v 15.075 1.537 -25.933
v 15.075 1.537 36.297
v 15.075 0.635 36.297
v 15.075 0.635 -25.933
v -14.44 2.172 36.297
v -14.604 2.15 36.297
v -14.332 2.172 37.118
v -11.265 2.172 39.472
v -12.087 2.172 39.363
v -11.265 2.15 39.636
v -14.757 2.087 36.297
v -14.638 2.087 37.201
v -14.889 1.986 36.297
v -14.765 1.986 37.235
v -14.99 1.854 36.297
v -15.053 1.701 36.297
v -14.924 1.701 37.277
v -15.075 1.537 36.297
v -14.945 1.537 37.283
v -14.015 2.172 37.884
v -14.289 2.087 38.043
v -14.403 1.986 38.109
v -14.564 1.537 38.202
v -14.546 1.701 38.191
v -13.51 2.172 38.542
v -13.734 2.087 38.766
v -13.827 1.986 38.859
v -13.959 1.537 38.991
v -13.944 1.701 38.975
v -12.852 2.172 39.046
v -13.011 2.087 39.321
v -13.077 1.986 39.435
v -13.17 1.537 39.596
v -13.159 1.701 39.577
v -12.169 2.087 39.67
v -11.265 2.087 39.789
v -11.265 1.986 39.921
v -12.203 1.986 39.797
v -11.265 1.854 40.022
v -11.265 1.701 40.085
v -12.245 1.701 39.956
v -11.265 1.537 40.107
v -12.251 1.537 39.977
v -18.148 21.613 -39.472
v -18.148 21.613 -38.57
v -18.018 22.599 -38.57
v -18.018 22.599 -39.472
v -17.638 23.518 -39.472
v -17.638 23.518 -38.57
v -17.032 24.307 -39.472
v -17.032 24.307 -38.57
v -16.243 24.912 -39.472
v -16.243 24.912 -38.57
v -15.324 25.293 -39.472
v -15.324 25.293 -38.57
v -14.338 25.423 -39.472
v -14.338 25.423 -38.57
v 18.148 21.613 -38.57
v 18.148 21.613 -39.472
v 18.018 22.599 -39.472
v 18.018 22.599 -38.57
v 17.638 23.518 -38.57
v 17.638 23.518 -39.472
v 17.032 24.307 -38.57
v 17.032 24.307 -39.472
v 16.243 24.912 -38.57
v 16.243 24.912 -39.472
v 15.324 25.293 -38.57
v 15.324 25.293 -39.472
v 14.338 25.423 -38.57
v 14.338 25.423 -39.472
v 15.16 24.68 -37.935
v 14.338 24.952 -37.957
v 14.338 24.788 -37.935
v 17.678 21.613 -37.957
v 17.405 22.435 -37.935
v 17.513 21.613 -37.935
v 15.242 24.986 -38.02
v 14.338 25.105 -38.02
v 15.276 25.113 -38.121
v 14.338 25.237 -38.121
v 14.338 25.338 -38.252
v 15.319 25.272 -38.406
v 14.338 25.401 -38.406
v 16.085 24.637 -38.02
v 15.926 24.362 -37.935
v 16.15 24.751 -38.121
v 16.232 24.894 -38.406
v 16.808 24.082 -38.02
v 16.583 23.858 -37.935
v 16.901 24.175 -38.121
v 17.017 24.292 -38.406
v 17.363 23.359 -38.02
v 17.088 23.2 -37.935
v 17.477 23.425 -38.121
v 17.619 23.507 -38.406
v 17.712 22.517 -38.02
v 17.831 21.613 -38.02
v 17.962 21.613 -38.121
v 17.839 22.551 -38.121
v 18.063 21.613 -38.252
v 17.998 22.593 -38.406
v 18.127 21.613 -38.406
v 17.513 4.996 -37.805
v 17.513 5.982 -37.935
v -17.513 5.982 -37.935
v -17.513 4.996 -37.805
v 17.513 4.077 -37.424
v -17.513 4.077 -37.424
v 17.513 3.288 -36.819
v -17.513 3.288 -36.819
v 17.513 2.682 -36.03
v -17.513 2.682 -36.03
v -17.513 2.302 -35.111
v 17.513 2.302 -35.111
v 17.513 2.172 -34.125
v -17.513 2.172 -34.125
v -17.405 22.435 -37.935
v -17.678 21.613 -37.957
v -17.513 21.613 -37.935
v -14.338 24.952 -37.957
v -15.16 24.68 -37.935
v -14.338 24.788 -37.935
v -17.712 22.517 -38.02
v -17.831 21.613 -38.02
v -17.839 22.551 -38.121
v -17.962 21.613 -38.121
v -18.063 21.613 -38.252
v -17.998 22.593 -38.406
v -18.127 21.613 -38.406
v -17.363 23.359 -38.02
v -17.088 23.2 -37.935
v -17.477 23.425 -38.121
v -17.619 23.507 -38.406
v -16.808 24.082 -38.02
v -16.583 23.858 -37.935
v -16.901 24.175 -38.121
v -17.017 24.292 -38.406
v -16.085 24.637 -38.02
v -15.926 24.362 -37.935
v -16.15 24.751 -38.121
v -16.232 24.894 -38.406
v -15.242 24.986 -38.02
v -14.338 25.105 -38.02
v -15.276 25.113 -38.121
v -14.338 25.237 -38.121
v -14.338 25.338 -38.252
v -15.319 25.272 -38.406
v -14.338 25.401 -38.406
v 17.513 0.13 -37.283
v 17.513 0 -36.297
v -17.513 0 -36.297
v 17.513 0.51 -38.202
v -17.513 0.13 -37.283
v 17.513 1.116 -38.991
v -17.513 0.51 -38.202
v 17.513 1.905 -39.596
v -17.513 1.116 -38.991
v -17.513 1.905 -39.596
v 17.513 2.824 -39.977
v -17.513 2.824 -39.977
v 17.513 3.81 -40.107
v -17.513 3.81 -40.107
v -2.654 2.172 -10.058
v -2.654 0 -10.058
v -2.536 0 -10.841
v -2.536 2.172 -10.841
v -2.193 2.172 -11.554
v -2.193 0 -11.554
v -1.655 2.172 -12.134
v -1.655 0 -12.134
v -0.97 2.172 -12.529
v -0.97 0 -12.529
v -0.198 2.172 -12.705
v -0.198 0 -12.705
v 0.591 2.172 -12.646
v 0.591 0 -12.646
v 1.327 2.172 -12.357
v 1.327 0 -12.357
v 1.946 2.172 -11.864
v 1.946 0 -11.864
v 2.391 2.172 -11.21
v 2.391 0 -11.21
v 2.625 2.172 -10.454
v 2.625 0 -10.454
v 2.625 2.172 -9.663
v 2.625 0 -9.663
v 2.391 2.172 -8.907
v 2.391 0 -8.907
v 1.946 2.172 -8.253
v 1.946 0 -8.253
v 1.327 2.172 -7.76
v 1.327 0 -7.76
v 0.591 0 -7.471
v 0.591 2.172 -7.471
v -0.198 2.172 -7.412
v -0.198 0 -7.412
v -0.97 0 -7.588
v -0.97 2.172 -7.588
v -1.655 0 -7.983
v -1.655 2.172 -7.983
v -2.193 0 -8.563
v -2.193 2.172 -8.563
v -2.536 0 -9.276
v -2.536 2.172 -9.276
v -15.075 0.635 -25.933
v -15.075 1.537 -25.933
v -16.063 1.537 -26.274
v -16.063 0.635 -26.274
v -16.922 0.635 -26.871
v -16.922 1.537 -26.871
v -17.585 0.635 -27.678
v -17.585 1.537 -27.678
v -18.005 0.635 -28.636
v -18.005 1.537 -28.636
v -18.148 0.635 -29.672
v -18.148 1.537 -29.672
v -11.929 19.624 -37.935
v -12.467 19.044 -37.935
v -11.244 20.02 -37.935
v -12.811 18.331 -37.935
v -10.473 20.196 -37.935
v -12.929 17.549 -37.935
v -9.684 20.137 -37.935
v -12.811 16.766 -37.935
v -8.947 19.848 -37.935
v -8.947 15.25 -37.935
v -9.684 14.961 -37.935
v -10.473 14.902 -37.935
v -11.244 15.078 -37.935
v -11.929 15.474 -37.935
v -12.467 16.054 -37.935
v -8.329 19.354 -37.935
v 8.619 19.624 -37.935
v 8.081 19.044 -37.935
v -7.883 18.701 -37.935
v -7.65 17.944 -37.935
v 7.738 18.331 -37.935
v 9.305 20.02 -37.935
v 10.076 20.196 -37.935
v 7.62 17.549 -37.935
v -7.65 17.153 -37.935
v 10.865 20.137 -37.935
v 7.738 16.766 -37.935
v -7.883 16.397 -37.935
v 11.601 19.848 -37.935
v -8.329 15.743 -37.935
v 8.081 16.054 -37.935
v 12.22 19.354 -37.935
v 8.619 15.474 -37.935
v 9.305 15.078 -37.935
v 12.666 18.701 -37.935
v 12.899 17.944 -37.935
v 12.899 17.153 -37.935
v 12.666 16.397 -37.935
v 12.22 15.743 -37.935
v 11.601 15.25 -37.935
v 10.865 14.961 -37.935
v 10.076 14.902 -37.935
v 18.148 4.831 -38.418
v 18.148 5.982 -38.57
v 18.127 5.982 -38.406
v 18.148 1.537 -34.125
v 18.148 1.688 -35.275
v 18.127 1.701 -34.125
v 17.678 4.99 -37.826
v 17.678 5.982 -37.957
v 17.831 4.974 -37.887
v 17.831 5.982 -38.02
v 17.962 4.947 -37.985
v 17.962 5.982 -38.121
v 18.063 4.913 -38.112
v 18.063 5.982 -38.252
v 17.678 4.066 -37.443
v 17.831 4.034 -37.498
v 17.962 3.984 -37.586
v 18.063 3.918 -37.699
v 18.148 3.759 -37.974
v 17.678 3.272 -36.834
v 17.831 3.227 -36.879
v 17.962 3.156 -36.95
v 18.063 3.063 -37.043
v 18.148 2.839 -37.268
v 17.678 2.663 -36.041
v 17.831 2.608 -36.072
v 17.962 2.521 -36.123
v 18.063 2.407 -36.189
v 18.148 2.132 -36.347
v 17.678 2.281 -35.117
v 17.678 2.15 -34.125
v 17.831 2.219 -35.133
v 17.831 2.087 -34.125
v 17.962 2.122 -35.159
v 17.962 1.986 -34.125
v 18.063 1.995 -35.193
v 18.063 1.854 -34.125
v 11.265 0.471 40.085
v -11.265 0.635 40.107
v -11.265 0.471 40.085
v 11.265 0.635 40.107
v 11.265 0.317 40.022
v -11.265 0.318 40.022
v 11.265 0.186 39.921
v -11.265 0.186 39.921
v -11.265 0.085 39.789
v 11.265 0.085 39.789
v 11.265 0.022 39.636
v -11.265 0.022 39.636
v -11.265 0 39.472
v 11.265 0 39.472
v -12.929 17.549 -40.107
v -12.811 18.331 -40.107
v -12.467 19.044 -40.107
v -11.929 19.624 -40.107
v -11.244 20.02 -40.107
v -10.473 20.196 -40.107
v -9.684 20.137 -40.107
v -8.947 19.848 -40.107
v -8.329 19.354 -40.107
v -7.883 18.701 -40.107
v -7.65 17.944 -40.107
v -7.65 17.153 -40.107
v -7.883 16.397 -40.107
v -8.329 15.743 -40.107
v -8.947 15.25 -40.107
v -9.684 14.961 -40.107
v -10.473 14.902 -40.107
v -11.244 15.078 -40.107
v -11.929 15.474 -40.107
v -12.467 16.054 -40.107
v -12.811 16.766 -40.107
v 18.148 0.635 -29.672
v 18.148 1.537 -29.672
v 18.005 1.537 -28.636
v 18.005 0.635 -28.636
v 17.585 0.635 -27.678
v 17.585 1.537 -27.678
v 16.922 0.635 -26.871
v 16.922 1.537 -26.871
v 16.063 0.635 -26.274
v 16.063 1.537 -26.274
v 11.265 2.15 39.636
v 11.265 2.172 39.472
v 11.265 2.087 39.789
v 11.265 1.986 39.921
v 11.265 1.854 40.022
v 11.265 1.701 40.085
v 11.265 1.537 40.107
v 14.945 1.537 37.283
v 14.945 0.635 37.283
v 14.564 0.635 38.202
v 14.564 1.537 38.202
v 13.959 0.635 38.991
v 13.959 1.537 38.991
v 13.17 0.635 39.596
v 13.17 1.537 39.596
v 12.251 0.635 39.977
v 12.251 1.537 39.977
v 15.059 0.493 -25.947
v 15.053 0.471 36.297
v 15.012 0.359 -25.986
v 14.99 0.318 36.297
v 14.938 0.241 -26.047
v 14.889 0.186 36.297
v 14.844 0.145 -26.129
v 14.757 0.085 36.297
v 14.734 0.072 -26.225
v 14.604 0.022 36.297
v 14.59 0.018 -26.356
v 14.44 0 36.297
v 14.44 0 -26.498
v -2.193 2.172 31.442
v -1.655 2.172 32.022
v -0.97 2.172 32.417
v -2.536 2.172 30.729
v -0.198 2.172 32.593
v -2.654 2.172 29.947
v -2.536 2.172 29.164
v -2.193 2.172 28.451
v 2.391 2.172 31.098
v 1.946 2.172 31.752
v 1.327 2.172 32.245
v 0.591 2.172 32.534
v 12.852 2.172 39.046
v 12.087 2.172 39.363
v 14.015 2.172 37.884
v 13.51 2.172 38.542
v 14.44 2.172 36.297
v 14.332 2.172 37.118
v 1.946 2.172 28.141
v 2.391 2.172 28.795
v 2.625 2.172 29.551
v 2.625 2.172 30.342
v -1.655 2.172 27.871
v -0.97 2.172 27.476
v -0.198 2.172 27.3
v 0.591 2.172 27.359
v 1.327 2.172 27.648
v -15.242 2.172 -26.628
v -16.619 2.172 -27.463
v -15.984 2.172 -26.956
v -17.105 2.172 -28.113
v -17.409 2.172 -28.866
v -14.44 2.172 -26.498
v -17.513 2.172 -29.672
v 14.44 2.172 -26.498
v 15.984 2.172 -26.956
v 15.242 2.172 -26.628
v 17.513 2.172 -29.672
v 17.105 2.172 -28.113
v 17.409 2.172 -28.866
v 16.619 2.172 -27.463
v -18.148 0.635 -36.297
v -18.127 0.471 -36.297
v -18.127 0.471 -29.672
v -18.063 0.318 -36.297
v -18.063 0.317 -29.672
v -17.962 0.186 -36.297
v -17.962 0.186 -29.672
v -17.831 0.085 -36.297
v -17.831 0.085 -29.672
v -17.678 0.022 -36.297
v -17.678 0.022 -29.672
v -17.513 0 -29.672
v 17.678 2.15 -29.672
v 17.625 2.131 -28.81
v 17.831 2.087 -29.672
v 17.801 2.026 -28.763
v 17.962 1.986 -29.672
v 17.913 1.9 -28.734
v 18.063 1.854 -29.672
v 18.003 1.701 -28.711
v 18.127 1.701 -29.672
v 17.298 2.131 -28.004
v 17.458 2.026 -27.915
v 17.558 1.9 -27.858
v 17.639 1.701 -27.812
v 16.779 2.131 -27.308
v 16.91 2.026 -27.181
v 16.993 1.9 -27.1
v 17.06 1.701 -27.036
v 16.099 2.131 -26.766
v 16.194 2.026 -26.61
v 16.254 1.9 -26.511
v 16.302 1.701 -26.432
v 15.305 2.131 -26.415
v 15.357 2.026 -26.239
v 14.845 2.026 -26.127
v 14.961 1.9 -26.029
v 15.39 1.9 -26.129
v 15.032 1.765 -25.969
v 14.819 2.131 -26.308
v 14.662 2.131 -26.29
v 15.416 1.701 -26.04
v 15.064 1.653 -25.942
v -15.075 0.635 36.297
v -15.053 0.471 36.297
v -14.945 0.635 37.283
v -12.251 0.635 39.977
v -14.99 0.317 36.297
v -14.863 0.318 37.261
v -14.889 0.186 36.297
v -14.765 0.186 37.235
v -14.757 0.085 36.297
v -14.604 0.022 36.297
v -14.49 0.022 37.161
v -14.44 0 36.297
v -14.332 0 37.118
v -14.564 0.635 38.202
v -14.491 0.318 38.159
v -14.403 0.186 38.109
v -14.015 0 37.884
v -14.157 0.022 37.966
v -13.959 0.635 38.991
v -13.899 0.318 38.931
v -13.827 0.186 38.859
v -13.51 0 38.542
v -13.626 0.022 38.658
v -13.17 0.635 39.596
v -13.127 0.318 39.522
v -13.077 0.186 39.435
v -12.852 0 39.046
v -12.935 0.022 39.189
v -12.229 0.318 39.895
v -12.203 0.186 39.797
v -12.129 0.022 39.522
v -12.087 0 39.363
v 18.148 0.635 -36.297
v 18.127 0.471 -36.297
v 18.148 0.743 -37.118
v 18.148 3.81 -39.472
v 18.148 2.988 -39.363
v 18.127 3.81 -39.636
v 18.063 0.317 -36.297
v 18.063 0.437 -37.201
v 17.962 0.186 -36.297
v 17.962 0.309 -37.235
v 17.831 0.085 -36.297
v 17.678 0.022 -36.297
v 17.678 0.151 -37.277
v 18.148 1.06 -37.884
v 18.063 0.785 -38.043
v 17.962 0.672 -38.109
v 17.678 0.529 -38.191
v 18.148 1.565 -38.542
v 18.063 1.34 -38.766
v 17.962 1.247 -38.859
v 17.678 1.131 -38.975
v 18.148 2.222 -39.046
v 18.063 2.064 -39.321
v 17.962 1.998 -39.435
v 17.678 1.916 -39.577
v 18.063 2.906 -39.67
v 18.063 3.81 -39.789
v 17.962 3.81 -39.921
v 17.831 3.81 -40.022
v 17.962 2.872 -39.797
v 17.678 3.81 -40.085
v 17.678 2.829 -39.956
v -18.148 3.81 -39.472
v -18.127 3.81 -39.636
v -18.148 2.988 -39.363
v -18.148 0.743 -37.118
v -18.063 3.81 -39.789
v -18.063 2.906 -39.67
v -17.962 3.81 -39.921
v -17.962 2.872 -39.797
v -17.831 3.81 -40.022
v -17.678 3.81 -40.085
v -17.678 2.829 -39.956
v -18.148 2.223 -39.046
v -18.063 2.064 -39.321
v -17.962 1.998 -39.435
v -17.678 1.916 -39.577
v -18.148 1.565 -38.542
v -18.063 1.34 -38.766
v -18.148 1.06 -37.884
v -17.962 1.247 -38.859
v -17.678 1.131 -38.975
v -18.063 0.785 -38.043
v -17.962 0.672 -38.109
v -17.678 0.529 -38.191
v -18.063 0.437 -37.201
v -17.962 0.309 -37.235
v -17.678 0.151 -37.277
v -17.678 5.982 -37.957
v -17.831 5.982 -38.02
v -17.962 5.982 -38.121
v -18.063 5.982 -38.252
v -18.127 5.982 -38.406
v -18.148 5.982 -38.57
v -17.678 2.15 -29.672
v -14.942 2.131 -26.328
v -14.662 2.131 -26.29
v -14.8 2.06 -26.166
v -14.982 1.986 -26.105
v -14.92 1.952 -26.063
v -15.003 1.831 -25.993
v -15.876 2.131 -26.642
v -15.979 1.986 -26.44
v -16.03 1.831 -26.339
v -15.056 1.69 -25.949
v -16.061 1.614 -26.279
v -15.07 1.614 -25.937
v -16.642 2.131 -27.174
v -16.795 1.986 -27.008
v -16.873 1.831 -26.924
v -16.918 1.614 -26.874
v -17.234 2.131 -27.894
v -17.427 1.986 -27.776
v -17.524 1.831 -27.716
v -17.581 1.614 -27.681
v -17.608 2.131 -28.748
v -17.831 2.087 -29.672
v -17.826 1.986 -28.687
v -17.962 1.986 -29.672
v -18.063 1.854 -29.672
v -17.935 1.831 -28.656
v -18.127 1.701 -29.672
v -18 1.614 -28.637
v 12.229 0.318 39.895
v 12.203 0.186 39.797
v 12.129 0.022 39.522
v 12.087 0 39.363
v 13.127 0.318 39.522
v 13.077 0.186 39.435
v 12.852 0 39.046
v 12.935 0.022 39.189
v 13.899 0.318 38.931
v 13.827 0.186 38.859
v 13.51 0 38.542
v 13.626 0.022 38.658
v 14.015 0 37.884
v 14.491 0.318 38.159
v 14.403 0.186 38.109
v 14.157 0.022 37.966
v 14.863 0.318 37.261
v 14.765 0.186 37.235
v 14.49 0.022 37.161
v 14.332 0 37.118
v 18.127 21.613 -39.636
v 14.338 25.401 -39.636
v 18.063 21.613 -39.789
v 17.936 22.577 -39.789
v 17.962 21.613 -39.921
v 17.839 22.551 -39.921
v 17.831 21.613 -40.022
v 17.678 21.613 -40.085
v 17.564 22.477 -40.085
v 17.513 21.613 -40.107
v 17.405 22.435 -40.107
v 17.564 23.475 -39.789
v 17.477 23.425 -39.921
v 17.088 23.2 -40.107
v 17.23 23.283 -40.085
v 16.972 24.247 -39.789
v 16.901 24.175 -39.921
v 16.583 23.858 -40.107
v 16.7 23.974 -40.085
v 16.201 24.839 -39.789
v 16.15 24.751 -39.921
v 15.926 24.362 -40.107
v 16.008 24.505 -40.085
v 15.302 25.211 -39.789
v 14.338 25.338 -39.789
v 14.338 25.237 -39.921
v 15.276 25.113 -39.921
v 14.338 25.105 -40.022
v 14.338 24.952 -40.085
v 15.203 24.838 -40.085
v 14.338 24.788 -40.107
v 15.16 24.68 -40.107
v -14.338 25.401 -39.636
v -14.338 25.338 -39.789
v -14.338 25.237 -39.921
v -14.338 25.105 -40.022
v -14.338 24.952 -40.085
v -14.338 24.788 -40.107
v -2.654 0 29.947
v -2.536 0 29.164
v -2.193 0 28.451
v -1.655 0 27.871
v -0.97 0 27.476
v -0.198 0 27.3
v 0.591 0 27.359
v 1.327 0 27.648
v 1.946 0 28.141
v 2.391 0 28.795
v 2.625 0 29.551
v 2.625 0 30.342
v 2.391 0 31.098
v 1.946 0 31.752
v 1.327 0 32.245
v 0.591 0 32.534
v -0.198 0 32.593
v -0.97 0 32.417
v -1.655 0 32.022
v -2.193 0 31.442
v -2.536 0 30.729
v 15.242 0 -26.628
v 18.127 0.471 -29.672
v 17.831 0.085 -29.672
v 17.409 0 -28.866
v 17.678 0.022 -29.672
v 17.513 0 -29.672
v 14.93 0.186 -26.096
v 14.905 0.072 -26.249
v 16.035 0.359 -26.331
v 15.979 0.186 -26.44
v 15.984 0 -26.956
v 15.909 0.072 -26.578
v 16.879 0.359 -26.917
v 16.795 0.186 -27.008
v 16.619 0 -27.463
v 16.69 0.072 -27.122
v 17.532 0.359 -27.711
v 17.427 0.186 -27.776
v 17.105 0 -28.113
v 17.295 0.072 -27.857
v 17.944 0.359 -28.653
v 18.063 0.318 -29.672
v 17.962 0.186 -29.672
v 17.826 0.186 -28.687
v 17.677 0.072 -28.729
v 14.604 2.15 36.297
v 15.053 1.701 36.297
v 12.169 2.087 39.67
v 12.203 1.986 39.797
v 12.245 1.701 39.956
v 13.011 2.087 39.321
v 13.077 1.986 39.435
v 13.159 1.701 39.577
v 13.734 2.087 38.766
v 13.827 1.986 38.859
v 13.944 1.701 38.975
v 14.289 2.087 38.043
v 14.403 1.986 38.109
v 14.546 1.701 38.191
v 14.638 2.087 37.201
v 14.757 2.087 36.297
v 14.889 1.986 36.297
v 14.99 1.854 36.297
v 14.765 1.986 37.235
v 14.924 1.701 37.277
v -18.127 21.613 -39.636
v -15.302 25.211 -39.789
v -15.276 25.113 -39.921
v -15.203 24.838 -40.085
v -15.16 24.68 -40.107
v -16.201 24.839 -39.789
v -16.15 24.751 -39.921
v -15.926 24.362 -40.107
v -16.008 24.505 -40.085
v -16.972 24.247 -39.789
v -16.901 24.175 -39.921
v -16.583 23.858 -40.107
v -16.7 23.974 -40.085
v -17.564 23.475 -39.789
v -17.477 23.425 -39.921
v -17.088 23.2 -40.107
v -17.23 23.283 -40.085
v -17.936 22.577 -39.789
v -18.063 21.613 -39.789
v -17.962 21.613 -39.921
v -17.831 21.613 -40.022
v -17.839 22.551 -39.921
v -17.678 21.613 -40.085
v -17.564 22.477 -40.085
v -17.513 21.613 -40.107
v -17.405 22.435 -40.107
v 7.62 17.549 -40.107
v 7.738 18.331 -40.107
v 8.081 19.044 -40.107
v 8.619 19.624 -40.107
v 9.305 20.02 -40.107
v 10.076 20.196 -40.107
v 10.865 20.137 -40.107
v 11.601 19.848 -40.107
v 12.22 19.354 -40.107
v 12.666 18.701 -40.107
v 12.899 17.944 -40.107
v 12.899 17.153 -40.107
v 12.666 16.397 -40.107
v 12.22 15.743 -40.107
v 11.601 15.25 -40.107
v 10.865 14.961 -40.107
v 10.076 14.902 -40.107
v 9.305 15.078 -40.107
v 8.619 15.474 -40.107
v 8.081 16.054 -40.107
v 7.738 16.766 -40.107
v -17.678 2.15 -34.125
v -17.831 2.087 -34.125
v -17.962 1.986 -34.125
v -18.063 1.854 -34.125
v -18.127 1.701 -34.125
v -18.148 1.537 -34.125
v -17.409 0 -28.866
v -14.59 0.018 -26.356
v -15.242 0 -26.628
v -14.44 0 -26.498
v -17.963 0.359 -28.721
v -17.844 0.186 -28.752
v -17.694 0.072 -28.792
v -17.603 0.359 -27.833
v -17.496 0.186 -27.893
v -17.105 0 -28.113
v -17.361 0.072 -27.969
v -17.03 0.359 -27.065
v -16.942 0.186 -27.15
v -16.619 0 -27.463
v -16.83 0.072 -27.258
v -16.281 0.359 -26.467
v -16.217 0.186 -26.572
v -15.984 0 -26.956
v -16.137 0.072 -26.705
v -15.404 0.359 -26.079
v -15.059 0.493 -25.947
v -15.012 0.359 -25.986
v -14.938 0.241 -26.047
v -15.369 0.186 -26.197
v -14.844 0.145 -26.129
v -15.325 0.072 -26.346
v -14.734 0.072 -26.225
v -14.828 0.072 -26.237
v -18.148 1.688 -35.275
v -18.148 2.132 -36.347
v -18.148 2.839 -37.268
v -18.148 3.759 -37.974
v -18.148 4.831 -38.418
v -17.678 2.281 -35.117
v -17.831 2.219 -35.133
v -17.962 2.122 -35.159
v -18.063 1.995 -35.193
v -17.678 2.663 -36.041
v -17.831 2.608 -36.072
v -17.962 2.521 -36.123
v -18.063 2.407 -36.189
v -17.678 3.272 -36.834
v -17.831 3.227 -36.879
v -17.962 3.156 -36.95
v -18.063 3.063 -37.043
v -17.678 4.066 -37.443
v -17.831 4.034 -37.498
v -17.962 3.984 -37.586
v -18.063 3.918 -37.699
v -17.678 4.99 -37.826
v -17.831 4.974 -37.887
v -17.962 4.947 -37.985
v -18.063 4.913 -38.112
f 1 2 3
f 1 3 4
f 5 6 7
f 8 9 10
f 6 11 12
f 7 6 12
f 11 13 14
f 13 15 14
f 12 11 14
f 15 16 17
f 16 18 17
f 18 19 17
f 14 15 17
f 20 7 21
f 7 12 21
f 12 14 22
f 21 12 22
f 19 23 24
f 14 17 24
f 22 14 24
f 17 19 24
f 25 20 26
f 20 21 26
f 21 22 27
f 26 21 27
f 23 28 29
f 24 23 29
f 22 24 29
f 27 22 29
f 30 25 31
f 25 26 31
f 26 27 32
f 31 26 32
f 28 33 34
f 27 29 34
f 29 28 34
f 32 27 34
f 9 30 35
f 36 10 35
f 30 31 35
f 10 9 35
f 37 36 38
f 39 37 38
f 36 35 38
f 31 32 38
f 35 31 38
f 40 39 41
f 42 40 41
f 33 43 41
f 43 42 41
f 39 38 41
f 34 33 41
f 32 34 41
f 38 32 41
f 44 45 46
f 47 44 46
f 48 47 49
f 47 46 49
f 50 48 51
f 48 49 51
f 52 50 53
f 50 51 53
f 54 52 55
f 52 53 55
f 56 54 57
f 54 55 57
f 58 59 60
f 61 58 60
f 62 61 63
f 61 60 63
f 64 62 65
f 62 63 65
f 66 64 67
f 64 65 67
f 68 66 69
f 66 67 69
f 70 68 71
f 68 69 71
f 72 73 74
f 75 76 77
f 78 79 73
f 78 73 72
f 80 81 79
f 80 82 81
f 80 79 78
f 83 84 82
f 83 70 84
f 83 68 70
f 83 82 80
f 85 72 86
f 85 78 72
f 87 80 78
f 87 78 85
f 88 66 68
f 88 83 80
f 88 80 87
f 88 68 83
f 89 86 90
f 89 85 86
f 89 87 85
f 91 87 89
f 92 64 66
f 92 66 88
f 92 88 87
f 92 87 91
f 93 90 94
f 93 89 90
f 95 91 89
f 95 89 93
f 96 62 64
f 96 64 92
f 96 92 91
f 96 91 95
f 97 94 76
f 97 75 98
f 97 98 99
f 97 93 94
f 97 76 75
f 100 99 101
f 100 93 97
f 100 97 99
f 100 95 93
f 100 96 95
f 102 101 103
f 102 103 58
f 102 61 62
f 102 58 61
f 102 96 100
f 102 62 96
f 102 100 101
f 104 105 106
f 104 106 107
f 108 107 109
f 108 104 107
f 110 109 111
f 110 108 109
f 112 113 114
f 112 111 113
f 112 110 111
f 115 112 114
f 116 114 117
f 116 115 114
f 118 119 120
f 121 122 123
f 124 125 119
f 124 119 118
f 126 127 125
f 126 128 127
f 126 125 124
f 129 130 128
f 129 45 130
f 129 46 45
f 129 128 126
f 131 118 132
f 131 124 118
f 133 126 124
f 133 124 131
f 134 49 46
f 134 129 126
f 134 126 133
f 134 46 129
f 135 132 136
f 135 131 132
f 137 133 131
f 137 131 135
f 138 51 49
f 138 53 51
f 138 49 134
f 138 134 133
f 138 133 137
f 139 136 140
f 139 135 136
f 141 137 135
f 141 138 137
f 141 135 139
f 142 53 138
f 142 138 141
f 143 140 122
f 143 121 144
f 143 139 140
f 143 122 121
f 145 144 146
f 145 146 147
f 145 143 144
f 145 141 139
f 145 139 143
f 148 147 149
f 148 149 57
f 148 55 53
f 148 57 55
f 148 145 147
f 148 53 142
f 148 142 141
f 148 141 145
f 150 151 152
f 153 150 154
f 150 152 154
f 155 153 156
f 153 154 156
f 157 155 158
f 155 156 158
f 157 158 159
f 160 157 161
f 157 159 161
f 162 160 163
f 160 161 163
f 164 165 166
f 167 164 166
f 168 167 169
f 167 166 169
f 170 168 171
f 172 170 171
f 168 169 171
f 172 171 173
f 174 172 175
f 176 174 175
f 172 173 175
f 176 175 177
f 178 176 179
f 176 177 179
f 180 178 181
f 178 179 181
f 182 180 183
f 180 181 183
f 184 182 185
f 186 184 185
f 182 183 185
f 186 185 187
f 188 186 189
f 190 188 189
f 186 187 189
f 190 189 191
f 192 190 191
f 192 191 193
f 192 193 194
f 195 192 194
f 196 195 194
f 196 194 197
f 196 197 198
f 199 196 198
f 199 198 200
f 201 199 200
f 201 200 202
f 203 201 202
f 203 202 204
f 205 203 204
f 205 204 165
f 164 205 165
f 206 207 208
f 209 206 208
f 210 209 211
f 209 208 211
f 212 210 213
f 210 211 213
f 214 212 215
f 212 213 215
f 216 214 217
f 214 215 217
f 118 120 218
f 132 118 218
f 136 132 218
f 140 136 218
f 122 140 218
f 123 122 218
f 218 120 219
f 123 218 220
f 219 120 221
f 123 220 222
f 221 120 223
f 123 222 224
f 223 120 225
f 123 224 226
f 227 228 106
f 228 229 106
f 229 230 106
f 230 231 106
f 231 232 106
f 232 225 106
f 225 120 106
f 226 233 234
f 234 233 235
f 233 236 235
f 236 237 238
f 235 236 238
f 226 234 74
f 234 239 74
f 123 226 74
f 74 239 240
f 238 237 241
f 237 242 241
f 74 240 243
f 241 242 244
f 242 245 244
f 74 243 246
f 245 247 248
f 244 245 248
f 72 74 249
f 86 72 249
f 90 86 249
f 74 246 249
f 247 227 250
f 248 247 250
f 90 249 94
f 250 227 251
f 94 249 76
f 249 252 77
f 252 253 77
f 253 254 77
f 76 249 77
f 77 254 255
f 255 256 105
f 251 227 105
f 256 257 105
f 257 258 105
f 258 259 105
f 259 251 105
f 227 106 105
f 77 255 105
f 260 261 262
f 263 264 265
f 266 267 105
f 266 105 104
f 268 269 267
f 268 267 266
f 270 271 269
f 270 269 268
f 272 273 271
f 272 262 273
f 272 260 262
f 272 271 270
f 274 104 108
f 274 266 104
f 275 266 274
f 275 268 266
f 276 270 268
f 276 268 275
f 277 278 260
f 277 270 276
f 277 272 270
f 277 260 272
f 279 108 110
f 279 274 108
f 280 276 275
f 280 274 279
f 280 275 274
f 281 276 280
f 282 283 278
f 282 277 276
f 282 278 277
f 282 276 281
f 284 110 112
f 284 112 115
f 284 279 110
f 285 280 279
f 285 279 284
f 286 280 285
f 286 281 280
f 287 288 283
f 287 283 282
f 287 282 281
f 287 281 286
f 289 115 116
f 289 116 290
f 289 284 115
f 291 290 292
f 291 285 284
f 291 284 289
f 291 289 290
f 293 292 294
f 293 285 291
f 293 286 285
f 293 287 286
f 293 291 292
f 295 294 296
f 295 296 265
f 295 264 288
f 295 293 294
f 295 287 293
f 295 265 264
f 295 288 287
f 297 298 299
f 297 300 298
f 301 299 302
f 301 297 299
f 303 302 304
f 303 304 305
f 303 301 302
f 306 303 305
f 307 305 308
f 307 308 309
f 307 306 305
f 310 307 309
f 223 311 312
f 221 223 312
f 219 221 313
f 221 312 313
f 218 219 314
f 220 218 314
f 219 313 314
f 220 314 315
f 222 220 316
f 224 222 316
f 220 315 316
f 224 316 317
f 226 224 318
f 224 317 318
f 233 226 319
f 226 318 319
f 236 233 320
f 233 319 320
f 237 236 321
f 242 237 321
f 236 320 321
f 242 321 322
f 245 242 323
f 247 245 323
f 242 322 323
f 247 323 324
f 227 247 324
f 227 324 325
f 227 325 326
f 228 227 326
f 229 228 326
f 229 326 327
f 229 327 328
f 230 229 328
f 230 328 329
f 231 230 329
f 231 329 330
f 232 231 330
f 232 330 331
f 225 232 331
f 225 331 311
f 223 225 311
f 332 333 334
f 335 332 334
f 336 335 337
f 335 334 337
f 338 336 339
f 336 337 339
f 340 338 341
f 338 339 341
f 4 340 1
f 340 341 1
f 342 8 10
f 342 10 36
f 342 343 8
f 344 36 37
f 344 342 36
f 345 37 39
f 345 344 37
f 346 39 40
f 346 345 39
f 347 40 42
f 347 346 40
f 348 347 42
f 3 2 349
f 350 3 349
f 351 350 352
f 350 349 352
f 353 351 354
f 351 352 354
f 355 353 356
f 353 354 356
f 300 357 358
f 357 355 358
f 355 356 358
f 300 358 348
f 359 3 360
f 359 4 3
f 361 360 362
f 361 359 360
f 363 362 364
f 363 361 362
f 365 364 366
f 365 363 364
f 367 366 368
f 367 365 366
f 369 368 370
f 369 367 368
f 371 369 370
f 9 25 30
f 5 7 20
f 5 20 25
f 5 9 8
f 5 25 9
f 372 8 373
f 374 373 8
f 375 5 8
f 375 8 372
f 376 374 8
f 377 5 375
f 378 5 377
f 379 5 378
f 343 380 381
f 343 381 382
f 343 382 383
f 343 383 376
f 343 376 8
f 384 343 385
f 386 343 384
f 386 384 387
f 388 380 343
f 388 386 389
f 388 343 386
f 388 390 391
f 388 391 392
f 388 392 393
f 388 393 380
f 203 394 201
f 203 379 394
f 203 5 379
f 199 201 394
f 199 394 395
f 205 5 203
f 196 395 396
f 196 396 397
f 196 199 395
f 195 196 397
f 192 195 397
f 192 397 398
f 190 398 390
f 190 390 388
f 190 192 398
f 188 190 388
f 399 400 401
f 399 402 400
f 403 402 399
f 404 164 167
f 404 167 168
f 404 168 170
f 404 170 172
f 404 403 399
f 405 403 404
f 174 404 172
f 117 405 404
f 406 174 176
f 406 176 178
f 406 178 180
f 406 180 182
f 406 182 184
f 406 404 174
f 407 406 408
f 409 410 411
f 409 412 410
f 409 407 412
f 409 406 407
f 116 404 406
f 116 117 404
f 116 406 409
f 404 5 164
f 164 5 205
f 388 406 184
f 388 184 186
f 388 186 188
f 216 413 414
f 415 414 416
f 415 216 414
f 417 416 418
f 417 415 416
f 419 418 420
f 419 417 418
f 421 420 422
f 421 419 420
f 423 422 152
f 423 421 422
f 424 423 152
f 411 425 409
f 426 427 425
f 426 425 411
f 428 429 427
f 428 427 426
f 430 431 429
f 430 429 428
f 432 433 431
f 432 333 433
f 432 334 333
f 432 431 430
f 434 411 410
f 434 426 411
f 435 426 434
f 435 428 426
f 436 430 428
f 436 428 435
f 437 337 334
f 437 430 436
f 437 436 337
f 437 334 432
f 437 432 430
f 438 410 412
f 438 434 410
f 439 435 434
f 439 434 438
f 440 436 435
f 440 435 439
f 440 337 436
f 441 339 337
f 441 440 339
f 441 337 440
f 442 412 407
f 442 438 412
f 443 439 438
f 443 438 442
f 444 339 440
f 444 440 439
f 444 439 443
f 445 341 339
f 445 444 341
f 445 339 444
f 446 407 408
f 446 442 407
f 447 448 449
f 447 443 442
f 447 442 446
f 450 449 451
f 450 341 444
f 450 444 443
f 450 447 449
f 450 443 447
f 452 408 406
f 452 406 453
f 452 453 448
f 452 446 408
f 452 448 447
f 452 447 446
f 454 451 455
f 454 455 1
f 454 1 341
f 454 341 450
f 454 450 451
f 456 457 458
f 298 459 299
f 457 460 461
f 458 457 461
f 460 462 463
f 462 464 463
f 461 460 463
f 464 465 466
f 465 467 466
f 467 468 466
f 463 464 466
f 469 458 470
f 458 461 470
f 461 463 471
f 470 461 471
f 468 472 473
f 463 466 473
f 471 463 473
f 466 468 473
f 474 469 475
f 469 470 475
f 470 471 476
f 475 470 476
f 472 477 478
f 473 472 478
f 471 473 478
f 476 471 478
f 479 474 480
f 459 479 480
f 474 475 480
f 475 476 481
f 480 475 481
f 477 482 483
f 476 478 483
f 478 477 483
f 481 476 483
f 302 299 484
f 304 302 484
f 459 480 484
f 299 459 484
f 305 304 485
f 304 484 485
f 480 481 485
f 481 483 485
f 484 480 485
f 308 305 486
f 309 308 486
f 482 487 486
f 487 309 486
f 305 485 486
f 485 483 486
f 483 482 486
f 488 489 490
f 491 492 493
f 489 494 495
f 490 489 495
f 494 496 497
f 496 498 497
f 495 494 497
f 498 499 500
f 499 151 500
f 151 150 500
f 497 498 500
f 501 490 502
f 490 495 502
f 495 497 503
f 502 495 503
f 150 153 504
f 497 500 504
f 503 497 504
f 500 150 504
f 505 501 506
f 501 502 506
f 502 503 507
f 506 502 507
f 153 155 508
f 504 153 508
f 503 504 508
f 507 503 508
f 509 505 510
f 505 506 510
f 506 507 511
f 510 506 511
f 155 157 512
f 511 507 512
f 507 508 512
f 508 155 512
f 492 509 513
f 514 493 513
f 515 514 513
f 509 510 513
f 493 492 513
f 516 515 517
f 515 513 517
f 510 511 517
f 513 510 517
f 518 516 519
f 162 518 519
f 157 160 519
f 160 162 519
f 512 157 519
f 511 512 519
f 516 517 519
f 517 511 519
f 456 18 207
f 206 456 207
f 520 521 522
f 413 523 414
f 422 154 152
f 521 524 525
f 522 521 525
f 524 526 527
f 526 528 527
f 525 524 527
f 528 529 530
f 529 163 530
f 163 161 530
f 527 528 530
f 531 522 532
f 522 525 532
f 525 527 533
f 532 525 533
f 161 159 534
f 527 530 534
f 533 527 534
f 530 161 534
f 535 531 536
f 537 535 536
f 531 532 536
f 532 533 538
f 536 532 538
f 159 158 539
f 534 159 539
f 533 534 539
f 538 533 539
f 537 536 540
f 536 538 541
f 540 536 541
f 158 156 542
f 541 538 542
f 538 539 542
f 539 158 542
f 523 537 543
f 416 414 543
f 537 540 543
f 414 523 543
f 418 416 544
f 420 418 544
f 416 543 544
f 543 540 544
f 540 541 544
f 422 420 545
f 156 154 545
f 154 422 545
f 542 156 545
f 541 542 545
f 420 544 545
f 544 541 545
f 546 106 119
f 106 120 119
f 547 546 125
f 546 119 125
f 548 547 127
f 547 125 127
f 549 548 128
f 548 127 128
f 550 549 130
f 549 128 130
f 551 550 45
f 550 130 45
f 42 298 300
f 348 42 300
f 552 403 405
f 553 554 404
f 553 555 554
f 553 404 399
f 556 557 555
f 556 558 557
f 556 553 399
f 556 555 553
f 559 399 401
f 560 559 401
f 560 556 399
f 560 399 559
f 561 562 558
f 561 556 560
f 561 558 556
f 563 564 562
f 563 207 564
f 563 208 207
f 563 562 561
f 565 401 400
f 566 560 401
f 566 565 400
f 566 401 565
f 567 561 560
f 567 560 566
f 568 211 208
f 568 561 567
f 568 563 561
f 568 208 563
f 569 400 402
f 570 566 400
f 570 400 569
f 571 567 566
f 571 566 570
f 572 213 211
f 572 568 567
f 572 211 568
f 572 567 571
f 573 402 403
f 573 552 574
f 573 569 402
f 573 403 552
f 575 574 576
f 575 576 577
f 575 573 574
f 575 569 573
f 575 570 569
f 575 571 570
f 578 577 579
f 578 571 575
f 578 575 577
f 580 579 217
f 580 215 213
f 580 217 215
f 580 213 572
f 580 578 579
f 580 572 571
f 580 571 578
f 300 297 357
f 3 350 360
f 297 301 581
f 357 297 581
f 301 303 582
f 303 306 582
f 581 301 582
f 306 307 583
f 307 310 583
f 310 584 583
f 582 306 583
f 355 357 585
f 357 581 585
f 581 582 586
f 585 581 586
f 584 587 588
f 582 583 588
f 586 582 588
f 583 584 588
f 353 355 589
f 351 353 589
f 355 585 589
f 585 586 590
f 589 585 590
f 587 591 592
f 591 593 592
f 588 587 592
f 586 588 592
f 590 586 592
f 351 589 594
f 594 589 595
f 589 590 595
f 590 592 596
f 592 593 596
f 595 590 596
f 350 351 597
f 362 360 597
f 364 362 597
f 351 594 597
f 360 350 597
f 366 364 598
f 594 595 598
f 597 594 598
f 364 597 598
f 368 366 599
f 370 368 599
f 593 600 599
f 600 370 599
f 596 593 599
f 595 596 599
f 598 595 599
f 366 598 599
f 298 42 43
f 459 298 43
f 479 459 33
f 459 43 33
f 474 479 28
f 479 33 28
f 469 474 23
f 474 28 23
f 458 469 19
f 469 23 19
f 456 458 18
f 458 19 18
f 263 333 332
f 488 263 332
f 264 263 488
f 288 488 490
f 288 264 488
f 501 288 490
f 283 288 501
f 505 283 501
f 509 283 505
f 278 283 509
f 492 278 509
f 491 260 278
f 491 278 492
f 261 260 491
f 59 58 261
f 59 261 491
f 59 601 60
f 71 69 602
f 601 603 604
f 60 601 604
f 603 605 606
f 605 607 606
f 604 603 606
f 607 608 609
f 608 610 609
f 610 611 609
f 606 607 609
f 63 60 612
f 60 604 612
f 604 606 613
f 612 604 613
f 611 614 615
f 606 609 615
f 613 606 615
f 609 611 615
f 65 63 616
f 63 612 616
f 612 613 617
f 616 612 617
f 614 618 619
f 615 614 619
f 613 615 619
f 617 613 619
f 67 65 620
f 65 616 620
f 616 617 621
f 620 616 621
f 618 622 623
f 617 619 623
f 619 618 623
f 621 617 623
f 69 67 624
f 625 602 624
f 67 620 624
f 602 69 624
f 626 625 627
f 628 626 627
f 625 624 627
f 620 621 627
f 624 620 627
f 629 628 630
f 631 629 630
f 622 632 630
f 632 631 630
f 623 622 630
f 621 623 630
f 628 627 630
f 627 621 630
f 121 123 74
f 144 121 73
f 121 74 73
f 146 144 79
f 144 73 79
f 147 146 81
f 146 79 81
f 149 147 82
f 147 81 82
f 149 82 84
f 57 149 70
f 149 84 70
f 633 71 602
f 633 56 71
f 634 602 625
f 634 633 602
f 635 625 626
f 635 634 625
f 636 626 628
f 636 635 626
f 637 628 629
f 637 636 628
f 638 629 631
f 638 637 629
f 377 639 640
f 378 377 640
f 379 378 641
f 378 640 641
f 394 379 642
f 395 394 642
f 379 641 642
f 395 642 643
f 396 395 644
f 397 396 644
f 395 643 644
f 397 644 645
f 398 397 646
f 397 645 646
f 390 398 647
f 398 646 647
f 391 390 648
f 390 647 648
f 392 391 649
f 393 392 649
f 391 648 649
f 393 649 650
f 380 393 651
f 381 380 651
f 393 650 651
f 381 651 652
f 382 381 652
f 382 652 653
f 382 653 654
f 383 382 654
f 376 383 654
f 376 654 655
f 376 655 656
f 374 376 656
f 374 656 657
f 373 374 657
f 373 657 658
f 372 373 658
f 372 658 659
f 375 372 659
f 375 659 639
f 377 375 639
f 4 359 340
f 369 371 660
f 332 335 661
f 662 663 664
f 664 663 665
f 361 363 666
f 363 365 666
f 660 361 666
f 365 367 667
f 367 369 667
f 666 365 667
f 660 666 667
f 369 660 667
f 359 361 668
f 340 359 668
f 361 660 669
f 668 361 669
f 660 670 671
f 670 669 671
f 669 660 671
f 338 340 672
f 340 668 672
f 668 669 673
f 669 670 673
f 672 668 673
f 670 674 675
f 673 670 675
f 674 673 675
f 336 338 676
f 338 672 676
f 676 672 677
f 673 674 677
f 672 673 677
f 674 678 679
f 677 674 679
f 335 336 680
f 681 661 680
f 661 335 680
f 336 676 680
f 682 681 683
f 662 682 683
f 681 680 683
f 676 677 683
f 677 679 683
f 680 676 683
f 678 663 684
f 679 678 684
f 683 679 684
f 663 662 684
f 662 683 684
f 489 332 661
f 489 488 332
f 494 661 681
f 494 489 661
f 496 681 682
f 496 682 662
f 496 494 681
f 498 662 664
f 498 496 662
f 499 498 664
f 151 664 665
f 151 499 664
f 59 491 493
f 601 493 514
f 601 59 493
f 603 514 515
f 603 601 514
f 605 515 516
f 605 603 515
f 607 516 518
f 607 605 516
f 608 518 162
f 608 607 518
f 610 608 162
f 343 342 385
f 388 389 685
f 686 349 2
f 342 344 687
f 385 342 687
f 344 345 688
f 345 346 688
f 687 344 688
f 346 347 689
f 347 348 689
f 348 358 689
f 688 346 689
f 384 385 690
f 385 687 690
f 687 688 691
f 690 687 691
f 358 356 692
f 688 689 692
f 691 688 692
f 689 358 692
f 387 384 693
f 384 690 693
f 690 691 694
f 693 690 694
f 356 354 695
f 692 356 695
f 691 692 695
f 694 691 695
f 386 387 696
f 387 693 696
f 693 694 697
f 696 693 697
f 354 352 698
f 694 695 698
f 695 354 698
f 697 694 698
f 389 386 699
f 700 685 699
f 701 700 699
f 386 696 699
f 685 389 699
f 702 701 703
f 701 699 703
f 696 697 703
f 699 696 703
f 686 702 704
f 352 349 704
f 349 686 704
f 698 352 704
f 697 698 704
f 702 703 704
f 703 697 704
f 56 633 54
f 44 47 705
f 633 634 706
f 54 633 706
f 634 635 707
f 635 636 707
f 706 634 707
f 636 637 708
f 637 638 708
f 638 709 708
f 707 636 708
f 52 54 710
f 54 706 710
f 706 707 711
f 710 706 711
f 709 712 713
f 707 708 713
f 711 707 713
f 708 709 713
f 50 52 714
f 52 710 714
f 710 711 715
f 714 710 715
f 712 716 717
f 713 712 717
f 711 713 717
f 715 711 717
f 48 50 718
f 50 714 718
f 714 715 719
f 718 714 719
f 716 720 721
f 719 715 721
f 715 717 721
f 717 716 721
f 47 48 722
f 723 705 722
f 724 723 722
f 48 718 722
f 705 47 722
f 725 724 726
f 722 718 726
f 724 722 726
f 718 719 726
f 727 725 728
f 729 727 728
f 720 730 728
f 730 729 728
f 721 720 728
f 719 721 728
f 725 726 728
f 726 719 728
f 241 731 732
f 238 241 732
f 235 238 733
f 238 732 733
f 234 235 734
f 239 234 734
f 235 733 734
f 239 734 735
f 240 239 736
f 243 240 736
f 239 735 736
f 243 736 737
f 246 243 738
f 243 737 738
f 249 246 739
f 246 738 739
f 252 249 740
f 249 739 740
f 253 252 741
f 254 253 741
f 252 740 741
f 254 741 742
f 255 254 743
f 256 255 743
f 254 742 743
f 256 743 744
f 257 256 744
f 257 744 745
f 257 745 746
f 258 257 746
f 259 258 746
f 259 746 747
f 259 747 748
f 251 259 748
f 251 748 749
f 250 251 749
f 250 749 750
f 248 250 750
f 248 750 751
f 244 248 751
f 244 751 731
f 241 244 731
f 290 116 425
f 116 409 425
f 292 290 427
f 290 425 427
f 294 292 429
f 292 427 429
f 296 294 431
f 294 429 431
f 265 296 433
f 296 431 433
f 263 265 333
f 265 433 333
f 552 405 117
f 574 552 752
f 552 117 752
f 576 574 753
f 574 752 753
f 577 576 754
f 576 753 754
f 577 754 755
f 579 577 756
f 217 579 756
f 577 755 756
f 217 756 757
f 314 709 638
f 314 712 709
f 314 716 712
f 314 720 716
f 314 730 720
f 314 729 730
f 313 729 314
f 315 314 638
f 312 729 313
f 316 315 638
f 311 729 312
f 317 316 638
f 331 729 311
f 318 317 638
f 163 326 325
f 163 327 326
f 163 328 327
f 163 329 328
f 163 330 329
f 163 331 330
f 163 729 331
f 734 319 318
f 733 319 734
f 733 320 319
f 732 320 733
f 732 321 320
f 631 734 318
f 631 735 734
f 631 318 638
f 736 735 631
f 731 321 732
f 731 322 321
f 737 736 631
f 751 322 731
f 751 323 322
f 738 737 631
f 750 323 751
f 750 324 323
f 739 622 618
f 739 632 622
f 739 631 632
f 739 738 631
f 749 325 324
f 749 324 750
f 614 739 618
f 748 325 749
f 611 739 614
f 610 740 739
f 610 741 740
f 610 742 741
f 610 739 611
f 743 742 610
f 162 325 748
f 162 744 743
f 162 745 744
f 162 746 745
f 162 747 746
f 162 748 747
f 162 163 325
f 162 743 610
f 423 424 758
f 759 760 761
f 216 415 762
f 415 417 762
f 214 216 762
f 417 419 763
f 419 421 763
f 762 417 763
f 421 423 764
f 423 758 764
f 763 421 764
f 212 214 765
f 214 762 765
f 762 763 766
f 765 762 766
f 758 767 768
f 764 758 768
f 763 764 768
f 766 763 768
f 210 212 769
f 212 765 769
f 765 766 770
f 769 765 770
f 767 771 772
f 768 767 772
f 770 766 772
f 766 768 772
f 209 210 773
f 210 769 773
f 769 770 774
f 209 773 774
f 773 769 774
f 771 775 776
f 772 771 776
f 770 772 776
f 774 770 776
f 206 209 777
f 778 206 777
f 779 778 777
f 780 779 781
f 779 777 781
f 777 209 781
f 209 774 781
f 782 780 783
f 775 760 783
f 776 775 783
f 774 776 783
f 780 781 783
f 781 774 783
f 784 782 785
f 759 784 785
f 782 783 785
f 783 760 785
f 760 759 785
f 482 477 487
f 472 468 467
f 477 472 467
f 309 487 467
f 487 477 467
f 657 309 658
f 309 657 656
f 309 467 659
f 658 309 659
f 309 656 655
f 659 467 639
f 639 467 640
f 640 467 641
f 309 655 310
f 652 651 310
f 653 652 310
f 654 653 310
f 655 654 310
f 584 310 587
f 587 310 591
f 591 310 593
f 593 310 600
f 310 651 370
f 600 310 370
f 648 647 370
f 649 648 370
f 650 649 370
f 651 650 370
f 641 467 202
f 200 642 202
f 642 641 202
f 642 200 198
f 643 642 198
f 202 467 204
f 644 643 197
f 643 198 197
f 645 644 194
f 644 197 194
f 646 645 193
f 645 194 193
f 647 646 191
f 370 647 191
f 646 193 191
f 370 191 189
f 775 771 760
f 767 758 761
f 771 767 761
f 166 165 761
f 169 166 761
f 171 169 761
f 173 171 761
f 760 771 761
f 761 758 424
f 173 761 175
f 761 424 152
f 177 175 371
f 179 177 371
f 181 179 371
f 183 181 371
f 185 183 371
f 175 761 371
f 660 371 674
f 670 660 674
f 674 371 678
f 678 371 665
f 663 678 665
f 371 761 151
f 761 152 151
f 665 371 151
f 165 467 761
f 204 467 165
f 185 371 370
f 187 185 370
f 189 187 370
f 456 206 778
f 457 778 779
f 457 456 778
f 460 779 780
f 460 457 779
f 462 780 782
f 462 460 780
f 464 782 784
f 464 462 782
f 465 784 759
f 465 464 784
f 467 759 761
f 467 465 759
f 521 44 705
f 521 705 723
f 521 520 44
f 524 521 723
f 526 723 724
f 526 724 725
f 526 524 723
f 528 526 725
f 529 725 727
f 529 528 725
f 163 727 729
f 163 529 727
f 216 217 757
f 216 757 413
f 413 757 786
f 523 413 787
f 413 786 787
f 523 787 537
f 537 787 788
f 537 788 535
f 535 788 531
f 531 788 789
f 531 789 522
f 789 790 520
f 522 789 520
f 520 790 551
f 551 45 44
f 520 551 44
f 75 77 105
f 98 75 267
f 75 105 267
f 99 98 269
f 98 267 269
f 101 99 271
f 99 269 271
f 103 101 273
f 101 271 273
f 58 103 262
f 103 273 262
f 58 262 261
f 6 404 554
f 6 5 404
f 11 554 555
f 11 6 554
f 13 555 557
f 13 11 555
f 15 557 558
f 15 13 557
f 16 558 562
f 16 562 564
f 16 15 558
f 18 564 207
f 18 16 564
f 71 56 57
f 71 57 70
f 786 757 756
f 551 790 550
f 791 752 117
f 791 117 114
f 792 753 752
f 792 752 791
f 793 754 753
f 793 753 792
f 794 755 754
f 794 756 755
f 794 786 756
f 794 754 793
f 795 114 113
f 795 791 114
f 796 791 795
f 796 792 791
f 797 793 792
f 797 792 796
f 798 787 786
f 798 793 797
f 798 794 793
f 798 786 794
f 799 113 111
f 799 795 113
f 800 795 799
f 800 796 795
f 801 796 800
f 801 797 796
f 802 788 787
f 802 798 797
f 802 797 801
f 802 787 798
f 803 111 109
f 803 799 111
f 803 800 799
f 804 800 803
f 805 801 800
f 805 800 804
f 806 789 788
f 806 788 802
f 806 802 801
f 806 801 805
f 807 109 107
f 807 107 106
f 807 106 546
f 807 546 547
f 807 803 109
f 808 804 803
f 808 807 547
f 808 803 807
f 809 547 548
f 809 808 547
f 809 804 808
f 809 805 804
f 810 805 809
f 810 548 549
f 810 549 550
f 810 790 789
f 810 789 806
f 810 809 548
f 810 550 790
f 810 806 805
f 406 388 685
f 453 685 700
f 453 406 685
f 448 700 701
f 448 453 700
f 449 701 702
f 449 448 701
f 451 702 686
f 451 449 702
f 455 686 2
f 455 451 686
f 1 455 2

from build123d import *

# Parameters (mm, degrees)
SKETCH1_W                  = 36.2966
SKETCH1_H                  = 80.2132
BOSS_BASE_DEPTH            = 2.1717
SKETCH3_W                  = 36.2966
SKETCH3_H                  = 2.1717
BOSS_LIP_DEPTH             = 23.25116
F_4_0_209_DIAMETER_HOLE1_D = 5.3086
F_4_0_209_DIAMETER_HOLE2_D = 5.3086
SKETCH19_W                 = 3.0734
SKETCH19_H                 = 66.04
CUT_EXTRUDE1_DEPTH         = 50.784702448
FILLET1_R                  = 3.81
FILLET4_R                  = 0.635


with BuildPart() as part:
    # Sketch1 → Boss-Base (new body)
    with BuildSketch(Plane(origin=(0, 0, 0), x_dir=(1, 0, 0), z_dir=(0, 1, 0))):
        Rectangle(SKETCH1_W, SKETCH1_H)
    extrude(amount=BOSS_BASE_DEPTH)

    # Sketch3 → Boss-Lip (add)
    with BuildSketch(Plane(origin=(0, 2.1717, 0), x_dir=(1, 0, 0), z_dir=(0, 1, 0))):
        with Locations((0, 39.02075)):
            Rectangle(SKETCH3_W, SKETCH3_H)
    extrude(amount=BOSS_LIP_DEPTH)

    # #4 (0.209) Diameter Hole1 (through all)
    with Locations(Plane(origin=(0, 2.1717, 0), x_dir=(1, 0, 0), z_dir=(0, 1, 0))):
        with Locations((0, -29.9466), (0, 10.0584)):
            Hole(F_4_0_209_DIAMETER_HOLE1_D / 2)

    # #4 (0.209) Diameter Hole2 (through all)
    with Locations(Plane.XY.offset(-37.9349)):
        with Locations((10.2743, 17.54886), (-10.2743, 17.54886)):
            Hole(F_4_0_209_DIAMETER_HOLE2_D / 2)

    # Sketch19 → Cut-Extrude1 (cut, through all)
    with BuildSketch(Plane(origin=(0, 2.1717, 0), x_dir=(1, 0, 0), z_dir=(0, 1, 0))):
        with Locations((16.6116, -7.0866)):
            Rectangle(SKETCH19_W, SKETCH19_H)
        with Locations((-16.6116, -7.0866)):
            Rectangle(SKETCH19_W, SKETCH19_H)
    extrude(amount=-CUT_EXTRUDE1_DEPTH, mode=Mode.SUBTRACT)

    # Fillet1
    # the kernel refuses this fillet: 3.81 mm, written as the material it adds along each edge
    with BuildSketch(Plane(origin=(18.1483, 2.1717, -37.9349), x_dir=(0, 0, 1), z_dir=(-1, 0, 0))) as fillet1_piece_1:
        with BuildLine():
            CenterArc((FILLET1_R, FILLET1_R), FILLET1_R, 180, 90)
            Line((0, FILLET1_R), (0, 0))
            Line((0, 0), (FILLET1_R, 0))
        make_face()
    extrude(amount=36.2966)
    # the kernel refuses this fillet: 3.81 mm, written as the material it takes off along each edge
    with BuildSketch(Plane(origin=(-18.1483, 11.51699308, -25.9334), x_dir=(0, 0, -1), z_dir=(0, -1, 0))) as fillet1_2_piece_1:
        with BuildLine():
            CenterArc((3.738117232, 3.81), FILLET1_R, 191.147377986, 78.852622014)
            Line((0, 3.0734), (0, 0))
            Line((0, 0), (3.738117232, 0))
        make_face()
    extrude(amount=20.86228616, mode=Mode.SUBTRACT)
    with BuildSketch(Plane(origin=(18.1483, 11.51699308, -25.9334), x_dir=(-1, 0, 0), z_dir=(0, -1, 0))) as fillet1_2_piece_2:
        with BuildLine():
            CenterArc((3.81, 3.738117232), FILLET1_R, 180, 78.852622014)
            Line((0, 3.738117232), (0, 0))
            Line((0, 0), (3.0734, 0))
        make_face()
    extrude(amount=20.86228616, mode=Mode.SUBTRACT)
    with BuildSketch(Plane(origin=(15.0749, 11.6967, 40.1066), x_dir=(-1, 0, 0), z_dir=(0, -1, 0))) as fillet1_2_piece_3:
        with BuildLine():
            CenterArc((FILLET1_R, FILLET1_R), FILLET1_R, 180, 90)
            Line((0, FILLET1_R), (0, 0))
            Line((0, 0), (FILLET1_R, 0))
        make_face()
    extrude(amount=21.2217, mode=Mode.SUBTRACT)
    with BuildSketch(Plane(origin=(-15.0749, 11.6967, 40.1066), x_dir=(1, 0, 0), z_dir=(0, -1, 0)), Plane(origin=(-18.1483, 25.42286, -28.4099), x_dir=(0, -1, 0), z_dir=(0, 0, -1)), Plane(origin=(18.1483, 25.42286, -49.6316), x_dir=(0, -1, 0), z_dir=(0, 0, 1))) as fillet1_2_piece_4:
        with BuildLine():
            CenterArc((FILLET1_R, -FILLET1_R), FILLET1_R, 90, 90)
            Line((0, -FILLET1_R), (0, 0))
            Line((0, 0), (FILLET1_R, 0))
        make_face()
    extrude(amount=21.2217, mode=Mode.SUBTRACT)
    with BuildSketch(Plane(origin=(-27.6733, 0, -40.1066), x_dir=(0, 0, 1), z_dir=(1, 0, 0))) as fillet1_2_piece_5:
        with BuildLine():
            CenterArc((FILLET1_R, -FILLET1_R), FILLET1_R, 90, 90)
            Line((0, -FILLET1_R), (0, 0))
            Line((0, 0), (FILLET1_R, 0))
        make_face()
    extrude(amount=55.3466, mode=Mode.SUBTRACT)

    # Fillet4
    fillet4_edges = [part.edges().sort_by_distance(p)[0] for p in [
        (18.1483, 3.287623164, -36.818976836),
        (-18.1483, 3.287623164, -36.818976836),
        (15.0749, 0, 5.1816),
        (15.0749, 2.1717, 5.1816),
        (18.1483, 13.79728, -37.9349),
        (0, 25.42286, -37.9349),
        (-18.1483, 13.79728, -37.9349),
        (17.032376836, 24.306936836, -37.9349),
        (-17.032376836, 24.306936836, -37.9349),
        (18.1483, 2.1717, -31.898208616),
        (-18.1483, 2.1717, -31.898208616),
        (-15.0749, 2.1717, 5.1816),
        (0, 2.1717, 40.1066),
        (-17.281304077, 2.1717, -27.251842254),
        (17.281304077, 2.1717, -27.251842254),
        (13.958976836, 2.1717, 38.990676836),
        (-13.958976836, 2.1717, 38.990676836),
        (-18.1483, 12.71143, -40.1066),
        (0, 25.42286, -40.1066),
        (18.1483, 12.71143, -40.1066),
        (17.032376836, 24.306936836, -40.1066),
        (-17.032376836, 24.306936836, -40.1066),
        (-18.1483, 0, -32.984058616),
        (-18.1483, 1.115923164, -38.990676836),
        (0, 0, 40.1066),
        (-15.0749, 0, 5.1816),
        (18.1483, 0, -32.984058616),
        (-17.281304077, 0, -27.251842254),
        (17.281304077, 0, -27.251842254),
        (13.958976836, 0, 38.990676836),
        (-13.958976836, 0, 38.990676836),
        (18.1483, 1.115923164, -38.990676836),
    ]]
    fillet(fillet4_edges, radius=FILLET4_R)


solid = part.part
